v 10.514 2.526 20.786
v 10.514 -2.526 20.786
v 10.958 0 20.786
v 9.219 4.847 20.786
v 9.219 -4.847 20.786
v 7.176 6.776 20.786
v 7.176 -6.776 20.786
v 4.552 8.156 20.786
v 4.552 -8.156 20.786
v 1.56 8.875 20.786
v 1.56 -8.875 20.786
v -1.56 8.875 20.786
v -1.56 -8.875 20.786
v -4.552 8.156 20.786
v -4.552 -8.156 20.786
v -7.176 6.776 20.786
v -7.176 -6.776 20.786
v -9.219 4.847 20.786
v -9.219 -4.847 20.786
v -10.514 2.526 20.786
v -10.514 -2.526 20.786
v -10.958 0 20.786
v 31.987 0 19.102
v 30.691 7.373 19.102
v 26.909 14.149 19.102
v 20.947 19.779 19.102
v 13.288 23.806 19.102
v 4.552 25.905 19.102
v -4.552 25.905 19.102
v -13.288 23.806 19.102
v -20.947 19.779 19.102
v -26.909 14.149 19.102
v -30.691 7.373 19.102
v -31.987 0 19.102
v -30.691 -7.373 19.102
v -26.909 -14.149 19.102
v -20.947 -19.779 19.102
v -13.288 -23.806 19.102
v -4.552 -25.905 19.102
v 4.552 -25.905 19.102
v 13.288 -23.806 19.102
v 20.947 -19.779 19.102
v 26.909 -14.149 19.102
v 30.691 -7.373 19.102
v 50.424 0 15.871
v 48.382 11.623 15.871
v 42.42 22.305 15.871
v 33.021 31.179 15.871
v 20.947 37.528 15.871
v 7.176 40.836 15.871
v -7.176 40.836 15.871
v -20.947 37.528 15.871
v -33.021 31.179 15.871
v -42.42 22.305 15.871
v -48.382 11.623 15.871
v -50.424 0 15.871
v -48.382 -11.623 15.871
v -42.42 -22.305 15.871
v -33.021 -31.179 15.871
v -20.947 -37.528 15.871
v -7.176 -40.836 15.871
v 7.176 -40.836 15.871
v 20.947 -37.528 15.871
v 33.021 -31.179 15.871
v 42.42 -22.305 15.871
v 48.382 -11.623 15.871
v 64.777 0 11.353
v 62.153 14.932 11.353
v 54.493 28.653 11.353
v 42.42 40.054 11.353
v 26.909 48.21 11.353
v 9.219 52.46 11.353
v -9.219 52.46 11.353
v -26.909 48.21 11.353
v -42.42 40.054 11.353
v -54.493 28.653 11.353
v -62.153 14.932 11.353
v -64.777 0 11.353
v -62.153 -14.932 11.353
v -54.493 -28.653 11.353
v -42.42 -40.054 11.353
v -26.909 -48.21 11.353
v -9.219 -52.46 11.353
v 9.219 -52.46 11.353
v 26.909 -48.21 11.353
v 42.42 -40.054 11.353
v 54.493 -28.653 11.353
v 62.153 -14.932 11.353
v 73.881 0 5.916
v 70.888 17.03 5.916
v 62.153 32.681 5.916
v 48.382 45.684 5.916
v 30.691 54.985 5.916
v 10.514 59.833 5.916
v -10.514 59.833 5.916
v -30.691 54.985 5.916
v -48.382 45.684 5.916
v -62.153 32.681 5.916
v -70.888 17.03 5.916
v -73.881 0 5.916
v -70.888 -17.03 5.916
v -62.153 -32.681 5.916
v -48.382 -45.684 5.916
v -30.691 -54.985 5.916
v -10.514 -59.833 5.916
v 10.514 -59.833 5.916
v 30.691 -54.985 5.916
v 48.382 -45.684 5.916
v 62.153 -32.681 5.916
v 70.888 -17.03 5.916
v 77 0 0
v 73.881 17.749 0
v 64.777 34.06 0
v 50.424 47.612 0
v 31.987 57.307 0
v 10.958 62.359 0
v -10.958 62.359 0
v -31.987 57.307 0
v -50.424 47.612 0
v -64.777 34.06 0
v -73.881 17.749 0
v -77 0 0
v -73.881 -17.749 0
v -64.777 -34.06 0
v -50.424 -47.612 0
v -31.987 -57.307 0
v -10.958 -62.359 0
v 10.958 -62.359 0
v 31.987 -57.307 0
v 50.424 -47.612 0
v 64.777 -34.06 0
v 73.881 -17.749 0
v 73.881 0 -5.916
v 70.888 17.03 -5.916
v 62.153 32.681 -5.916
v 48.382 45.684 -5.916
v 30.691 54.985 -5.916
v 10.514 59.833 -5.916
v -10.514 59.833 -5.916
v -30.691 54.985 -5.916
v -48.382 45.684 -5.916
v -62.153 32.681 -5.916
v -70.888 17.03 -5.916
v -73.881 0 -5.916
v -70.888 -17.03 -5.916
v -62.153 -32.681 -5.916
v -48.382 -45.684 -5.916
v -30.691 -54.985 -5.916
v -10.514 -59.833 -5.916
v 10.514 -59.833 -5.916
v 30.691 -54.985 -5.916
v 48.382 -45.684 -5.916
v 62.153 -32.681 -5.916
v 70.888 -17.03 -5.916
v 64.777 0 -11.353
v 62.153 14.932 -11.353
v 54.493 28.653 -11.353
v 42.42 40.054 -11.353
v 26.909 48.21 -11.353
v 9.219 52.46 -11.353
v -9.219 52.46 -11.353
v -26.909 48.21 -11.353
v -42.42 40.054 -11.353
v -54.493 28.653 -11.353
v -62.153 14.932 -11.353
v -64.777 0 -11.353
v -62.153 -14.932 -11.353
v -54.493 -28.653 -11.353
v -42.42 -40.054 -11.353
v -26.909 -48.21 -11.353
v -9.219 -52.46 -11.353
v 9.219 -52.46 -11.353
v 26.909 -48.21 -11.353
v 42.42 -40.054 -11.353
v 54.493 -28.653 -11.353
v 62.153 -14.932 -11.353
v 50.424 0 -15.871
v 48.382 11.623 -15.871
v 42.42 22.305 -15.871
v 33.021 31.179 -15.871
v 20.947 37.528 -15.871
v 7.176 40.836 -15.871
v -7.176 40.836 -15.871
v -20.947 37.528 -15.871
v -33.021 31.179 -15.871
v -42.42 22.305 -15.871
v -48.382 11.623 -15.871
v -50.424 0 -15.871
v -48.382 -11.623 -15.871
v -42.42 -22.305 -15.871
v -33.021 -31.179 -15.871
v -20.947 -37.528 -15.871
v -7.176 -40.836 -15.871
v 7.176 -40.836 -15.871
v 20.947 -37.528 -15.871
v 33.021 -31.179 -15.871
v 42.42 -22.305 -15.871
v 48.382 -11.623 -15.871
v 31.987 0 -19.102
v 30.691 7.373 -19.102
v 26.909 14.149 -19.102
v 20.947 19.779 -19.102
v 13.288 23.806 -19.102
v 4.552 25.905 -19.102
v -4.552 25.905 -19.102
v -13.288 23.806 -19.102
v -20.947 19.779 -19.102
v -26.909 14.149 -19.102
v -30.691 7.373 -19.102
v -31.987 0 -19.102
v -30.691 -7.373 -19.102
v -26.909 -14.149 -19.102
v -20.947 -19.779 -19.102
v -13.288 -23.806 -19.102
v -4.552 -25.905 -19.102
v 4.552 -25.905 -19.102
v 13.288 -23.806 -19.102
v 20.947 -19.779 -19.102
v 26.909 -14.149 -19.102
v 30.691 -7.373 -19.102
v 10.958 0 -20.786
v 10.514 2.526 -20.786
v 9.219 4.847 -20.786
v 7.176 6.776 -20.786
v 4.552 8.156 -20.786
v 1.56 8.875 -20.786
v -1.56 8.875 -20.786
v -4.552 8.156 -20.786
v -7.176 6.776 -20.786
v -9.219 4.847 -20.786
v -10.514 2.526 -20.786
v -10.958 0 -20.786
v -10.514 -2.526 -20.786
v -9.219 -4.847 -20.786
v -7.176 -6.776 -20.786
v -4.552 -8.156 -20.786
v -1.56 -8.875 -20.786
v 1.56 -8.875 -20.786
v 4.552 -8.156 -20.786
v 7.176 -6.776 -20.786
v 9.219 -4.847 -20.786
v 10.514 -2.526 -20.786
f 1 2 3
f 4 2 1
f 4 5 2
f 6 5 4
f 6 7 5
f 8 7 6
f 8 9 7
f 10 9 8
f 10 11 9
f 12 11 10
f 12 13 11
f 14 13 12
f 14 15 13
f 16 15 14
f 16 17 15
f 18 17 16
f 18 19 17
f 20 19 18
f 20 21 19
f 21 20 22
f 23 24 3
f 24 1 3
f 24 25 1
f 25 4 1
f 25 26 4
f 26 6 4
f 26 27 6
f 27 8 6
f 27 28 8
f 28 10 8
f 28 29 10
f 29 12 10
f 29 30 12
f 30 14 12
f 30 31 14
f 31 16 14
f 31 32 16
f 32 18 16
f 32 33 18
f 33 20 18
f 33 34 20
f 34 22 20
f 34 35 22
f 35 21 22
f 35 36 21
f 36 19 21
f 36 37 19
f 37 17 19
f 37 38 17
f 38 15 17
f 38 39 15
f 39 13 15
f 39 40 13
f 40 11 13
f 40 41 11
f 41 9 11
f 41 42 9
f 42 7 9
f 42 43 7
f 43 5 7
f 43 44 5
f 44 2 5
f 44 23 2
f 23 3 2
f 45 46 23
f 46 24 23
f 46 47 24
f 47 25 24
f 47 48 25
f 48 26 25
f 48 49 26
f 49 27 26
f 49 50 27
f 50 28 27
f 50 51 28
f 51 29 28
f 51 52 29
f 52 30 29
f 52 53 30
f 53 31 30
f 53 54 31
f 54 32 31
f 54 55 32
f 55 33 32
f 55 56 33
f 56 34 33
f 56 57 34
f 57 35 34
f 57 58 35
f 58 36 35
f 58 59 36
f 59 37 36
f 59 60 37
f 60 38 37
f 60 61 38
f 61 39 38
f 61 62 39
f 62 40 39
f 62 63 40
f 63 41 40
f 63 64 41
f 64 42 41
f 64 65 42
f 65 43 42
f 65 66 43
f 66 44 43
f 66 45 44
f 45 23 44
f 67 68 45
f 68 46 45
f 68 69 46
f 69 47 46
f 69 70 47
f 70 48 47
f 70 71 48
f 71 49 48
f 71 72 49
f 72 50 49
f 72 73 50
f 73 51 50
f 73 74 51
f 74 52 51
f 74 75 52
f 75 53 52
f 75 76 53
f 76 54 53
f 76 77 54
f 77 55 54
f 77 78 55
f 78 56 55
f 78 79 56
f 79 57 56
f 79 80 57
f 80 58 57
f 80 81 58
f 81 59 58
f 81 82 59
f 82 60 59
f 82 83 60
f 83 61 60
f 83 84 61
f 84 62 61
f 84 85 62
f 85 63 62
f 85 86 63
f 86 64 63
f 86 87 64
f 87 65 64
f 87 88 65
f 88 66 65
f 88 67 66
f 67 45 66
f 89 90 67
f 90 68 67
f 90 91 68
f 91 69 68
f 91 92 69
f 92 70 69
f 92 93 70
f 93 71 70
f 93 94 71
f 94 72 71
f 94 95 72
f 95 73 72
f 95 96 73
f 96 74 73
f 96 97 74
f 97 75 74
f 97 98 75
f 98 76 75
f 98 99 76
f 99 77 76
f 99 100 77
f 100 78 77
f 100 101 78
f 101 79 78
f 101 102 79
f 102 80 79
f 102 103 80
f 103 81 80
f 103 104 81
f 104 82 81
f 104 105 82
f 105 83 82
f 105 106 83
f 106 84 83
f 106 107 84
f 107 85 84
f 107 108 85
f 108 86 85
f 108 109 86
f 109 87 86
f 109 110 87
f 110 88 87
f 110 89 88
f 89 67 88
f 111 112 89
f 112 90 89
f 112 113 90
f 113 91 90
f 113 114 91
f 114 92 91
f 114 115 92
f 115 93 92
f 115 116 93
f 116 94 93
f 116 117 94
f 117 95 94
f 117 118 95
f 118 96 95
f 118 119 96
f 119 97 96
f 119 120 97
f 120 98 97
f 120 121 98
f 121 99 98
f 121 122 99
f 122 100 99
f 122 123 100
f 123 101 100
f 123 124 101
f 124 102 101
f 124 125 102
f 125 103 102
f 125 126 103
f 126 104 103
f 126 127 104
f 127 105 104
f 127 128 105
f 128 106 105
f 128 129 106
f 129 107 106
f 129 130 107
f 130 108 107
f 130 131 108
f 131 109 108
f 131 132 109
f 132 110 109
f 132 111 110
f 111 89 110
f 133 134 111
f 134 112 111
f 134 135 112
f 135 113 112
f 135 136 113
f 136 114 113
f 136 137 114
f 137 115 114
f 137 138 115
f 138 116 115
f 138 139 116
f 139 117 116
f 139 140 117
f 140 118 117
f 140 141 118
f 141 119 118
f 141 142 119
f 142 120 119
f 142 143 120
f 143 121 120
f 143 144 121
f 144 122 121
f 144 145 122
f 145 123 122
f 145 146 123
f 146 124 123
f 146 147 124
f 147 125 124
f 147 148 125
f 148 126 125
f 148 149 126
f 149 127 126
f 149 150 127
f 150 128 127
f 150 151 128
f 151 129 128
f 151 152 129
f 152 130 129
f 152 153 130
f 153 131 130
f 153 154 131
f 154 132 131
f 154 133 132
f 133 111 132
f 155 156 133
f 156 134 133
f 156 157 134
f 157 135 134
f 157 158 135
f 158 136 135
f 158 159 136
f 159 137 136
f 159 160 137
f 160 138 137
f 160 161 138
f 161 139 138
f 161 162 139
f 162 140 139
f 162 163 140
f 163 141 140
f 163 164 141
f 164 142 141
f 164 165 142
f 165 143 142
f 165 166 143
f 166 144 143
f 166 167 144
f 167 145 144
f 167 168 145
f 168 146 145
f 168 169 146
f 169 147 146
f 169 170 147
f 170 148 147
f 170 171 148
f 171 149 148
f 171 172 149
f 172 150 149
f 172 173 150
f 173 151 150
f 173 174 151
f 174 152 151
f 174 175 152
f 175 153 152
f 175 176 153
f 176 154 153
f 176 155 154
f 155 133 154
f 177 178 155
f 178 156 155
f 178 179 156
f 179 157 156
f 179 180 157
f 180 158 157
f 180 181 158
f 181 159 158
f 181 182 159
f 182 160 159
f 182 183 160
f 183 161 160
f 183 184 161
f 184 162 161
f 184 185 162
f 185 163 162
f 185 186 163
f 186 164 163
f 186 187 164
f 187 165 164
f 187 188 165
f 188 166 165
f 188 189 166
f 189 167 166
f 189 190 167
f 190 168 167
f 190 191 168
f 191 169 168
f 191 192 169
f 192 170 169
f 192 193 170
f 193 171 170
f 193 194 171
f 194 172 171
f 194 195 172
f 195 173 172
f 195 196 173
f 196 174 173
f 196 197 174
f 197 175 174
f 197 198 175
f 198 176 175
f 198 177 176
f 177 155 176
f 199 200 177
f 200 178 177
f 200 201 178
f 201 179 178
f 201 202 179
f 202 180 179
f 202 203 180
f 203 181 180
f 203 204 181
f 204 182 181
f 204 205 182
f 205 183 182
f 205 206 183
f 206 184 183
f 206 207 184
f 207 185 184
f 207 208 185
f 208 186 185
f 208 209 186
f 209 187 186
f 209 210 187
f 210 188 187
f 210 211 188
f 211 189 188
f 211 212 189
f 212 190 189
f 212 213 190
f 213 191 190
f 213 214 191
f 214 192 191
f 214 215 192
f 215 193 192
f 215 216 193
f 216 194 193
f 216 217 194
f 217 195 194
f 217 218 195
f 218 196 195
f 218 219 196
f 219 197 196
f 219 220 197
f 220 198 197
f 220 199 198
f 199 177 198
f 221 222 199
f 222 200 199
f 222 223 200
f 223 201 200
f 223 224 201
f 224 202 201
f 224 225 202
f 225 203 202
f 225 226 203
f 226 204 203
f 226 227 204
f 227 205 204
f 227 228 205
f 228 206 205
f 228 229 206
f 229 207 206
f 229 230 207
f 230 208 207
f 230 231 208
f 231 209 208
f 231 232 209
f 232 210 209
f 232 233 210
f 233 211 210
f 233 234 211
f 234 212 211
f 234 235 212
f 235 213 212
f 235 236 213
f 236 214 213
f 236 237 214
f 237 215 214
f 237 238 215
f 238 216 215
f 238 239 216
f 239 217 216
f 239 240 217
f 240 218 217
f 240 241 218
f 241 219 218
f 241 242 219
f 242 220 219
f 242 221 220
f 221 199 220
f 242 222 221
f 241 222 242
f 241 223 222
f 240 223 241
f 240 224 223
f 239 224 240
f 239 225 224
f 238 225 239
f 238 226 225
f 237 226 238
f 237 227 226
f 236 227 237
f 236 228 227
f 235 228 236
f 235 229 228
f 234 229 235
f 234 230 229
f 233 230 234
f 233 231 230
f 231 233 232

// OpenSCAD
// Generated by SolidPython 1.0.1 on 2020-07-29 00:46:49


scale(v = [11, 9, 3]) {
	sphere(r = 7);
}
/***********************************************
*********      SolidPython code:      **********
************************************************
 
# import packages: SolidPython
from solid import *
from solid.utils import *
from itertools import chain, combinations, permutations


class Resize:

    def __init__(self, scad_file):
        self.scad_file = scad_file
        #self.scad_file = import_scad(scad_file)
        # cone/cylinder param:
        self.r1 = 0
        self.r2 = 0
        self.h = 0
        # rectangular prism param:
        self.w = 0
        self.l = 0
        # ellipse param:
        self.r = 0

    # import OpenScad code (file name corresponds to shape)


    # classify shape + parameters
    def assign(self, param1, param2, param3):
        if self.scad_file == 'cone.scad':
            self.r1 = param1
            self.r2 = param2
            self.h = param3
        elif self.scad_file == 'cylinder.scad':
            self.r1 = param1
            self.r2 = param2
            self.h = param3
        elif self.scad_file == 'rectangularPrism.scad':
            self.h = param1
            self.l = param2
            self.w = param3
        else:
            self.r = param1
            self.h = param2

    # resize parameters
    def iterate(self):
        x = range(3, 20, 2)
        i = 1
        if self.scad_file == 'cone.scad':
            tempList = list(permutations(x, 2))
            for temp in tempList:
                param1 = temp[0]
                param2 = temp[1]
                filepath = 'produced_scad_files/' + 'cone' + str(param1) + '_' + str(param2) + '_' + '.scad'
                scad_render_to_file(cylinder(h=param1, r1=param2, r2=0), filepath)

        elif self.scad_file == 'cylinder.scad':
            tempList = list(permutations(x, 3))
            for temp in tempList:
                param1 = temp[0]
                param2 = temp[1]
                filepath = 'produced_scad_files/' + 'cylinder' + str(param1) + '_' + str(param2) + '_' + '.scad'
                scad_render_to_file(cylinder(h=param1, r1=param2, r2=param2), filepath)

        elif self.scad_file == 'rectangularPrism.scad':
            tempList = list(permutations(x, 3))
            for temp in tempList:
                param1 = temp[0]
                param2 = temp[1]
                param3 = temp[2]
                filepath = 'produced_scad_files/' + 'rectangularPrism' + str(param1) + '_' + str(param2) + '_' + str(
                    param3) + '.scad'
                scad_render_to_file(cube(size=(param1, param2, param3)), filepath)

        elif self.scad_file == 'ellipse.scad':
            tempList = list(permutations(x, 4))
            for temp in tempList:
                param1 = temp[0]
                param2 = temp[1]
                param3 = temp[2]
                param4 = temp[3]
                filepath = 'produced_scad_files/' + 'ellipse' + str(param1) + '_' + str(param2) + '_' + str(param3) + '_' + str(param4) + '.scad'
                scad_render_to_file(scale([param1, param2, param3])(sphere(r=param4)), filepath)

    def render_to_scadfile(self):
        scad_render_to_file(scad, 'example.scad') 
 
************************************************/
